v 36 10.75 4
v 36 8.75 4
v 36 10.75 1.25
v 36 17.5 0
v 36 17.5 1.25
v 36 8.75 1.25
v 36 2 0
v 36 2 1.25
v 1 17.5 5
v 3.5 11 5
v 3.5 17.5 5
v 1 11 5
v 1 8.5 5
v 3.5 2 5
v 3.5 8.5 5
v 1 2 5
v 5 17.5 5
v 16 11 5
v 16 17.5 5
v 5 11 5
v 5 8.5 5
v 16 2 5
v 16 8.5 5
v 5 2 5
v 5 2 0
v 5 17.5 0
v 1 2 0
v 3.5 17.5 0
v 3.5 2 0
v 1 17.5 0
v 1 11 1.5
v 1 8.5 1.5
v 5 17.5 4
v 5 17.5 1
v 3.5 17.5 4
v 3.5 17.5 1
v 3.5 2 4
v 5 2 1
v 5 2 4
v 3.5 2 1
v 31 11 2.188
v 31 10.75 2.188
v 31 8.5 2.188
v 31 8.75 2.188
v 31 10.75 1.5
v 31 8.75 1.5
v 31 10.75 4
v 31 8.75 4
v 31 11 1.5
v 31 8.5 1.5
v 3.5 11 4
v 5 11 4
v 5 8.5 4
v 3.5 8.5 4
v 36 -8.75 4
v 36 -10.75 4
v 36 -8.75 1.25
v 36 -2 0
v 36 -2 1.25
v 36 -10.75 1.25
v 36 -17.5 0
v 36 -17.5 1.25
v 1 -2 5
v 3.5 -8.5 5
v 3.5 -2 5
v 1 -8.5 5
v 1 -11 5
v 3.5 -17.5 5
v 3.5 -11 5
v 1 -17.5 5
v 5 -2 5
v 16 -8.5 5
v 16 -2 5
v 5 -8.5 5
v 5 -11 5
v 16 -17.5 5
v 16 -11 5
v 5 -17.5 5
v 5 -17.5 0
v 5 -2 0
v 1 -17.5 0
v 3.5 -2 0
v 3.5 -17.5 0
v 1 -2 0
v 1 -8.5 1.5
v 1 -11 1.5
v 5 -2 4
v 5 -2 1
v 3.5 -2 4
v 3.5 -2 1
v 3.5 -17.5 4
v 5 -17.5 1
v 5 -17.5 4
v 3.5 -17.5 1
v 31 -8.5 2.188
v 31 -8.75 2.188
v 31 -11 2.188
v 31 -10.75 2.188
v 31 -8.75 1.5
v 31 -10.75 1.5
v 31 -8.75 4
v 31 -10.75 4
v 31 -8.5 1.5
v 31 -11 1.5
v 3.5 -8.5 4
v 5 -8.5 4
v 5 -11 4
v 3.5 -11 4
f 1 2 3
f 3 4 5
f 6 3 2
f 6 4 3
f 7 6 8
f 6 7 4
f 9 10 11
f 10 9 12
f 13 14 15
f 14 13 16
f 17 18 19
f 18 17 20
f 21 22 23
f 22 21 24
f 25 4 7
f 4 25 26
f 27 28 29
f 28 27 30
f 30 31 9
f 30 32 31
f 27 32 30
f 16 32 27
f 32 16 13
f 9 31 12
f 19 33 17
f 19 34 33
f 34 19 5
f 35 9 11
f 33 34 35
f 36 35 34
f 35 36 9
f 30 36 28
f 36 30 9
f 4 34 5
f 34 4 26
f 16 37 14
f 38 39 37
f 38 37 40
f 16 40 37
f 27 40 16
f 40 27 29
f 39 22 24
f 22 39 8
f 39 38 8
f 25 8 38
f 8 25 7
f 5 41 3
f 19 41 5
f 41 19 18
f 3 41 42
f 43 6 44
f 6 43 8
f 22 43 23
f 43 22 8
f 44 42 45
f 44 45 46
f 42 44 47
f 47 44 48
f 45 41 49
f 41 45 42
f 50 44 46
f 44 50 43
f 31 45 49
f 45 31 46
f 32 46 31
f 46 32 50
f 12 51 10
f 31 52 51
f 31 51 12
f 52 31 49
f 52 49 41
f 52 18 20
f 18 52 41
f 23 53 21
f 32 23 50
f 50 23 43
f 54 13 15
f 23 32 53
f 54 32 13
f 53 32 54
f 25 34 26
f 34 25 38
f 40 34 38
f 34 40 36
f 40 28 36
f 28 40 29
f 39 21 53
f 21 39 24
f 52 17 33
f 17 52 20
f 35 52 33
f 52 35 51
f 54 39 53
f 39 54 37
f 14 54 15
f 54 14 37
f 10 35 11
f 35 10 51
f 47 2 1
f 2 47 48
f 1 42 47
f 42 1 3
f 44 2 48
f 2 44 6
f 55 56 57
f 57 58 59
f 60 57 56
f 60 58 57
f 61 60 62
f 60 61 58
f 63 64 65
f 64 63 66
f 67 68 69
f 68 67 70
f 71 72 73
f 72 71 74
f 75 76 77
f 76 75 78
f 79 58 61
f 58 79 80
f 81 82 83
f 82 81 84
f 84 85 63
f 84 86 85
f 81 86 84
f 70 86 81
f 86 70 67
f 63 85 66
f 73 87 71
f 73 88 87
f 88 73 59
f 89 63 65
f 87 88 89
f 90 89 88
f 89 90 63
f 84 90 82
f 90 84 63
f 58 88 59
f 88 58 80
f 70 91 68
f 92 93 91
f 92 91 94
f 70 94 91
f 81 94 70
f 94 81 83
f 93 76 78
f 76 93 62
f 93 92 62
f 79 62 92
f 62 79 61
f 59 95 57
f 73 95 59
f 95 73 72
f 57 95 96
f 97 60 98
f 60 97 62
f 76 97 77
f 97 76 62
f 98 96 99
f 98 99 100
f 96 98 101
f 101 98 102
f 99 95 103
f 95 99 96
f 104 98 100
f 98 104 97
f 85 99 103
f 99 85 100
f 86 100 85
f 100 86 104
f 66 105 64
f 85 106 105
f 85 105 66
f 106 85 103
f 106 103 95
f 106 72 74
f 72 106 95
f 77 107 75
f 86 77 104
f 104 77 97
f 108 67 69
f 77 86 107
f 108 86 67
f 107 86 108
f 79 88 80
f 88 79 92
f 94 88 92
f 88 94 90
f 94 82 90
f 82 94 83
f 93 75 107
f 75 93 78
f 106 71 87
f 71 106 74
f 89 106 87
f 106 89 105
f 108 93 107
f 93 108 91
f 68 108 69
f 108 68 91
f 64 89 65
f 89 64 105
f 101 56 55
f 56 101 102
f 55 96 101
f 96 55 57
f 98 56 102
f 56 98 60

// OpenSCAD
/*
 *  Window Wedges
 *  Copyright (c) 2019 David M. Syzdek <david@syzdek.net>
 *
 *  Redistribution and use in source and binary forms, with or without
 *  modification, are permitted provided that the following conditions are
 *  met:
 *
 *     * Redistributions of source code must retain the above copyright
 *       notice, this list of conditions and the following disclaimer.
 *     * Redistributions in binary form must reproduce the above copyright
 *       notice, this list of conditions and the following disclaimer in the
 *       documentation and/or other materials provided with the distribution.
 *     * Neither the name of David M. Syzdek nor the
 *       names of its contributors may be used to endorse or promote products
 *       derived from this software without specific prior written permission.
 *
 *  THIS SOFTWARE IS PROVIDED BY THE COPYRIGHT HOLDERS AND CONTRIBUTORS "AS
 *  IS" AND ANY EXPRESS OR IMPLIED WARRANTIES, INCLUDING, BUT NOT LIMITED TO,
 *  THE IMPLIED WARRANTIES OF MERCHANTABILITY AND FITNESS FOR A PARTICULAR
 *  PURPOSE ARE DISCLAIMED. IN NO EVENT SHALL DAVID M. SYZDEK BE LIABLE FOR
 *  ANY DIRECT, INDIRECT, INCIDENTAL, SPECIAL, EXEMPLARY, OR CONSEQUENTIAL
 *  DAMAGES (INCLUDING, BUT NOT LIMITED TO, PROCUREMENT OF SUBSTITUTE GOODS OR
 *  SERVICES; LOSS OF USE, DATA, OR PROFITS; OR BUSINESS INTERRUPTION) HOWEVER
 *  CAUSED AND ON ANY THEORY OF LIABILITY, WHETHER IN CONTRACT, STRICT
 *  LIABILITY, OR TORT (INCLUDING NEGLIGENCE OR OTHERWISE) ARISING IN ANY WAY
 *  OUT OF THE USE OF THIS SOFTWARE, EVEN IF ADVISED OF THE POSSIBILITY OF
 *  SUCH DAMAGE.
 *
 *  This is a non-permanent, adjustable stopper for a casement window. The
 *  stopper works by placing two opposing, interlocked wedges within the
 *  track of the sash runner.  As the runner pushes against the wedges, the
 *  wedges lock into place using friction generated by the pressure on the
 *  wedges to prevent the sash from moving forward.
 *
 *  Window Wedges are placed in a casement window oerator's track to restrict
 *  movement of the operator arm with the purpose of either preventing the
 *  from fulling opening or from fulling closing.
 *
 *  To adjust the placement of the wedges:
 *     1. Loosen the wedges by using the fingernail notches to pull the wedges
 *        apart.
 *     2. Adjust the location of the wedges by pulling the leading wedge using
 *        the fingernail notches in the direction of intended adjustment.
 *     3. Once the wedges are adjusted to the desired location, squeeze the two
 *        wedges together to lock into place.
 */


// width of window operator track
track_width  = 15.5;

// height of window operator track
track_height = 5.0;  // height of window operator track


module window_stopper(w, h)
{
   s = 3.0*h;            // length of pull stub
   l = h*4;              // length of slope
   a = atan((h*0.75)/l); // angle of slope

   union()
   {
      difference()
      {
         // creates base
         translate([  0, 0, 0 ])
            cube([  l+s, w, h ], center = false);

         // cuts slope
         translate( [   s,  -1,   h ] )
            rotate( [   0,   a,   0 ] )
            cube(   [ l*2, w+2, h*2 ], center=false);

         // cuts track for catch
         translate([      -1, (w/2)-1.25, 1.5 ] )
            cube(  [ s+l-h+1,        2.5,   h ], center=false);

         // cuts bottom fingernail tab
         translate([ 2.5,  -1,  -1 ] )
            cube([   1.5, w+2,   2 ], center=false);

         // cuts top fingernail tab
         translate([ 2.5,  -1, h-1 ] )
            cube([   1.5, w+2,   2 ], center=false);
      };

      // adds catch
      translate( [ l+s-h, (w/2)-1.0,     0 ] )
         cube(   [     h,       2.0, h-1.0 ], center=false);
   };
};


// bottom stopper
translate([1,               2, 0]) window_stopper( track_width, track_height );
translate([1, 0-track_width-2, 0]) window_stopper( track_width, track_height );


/* end of script */
